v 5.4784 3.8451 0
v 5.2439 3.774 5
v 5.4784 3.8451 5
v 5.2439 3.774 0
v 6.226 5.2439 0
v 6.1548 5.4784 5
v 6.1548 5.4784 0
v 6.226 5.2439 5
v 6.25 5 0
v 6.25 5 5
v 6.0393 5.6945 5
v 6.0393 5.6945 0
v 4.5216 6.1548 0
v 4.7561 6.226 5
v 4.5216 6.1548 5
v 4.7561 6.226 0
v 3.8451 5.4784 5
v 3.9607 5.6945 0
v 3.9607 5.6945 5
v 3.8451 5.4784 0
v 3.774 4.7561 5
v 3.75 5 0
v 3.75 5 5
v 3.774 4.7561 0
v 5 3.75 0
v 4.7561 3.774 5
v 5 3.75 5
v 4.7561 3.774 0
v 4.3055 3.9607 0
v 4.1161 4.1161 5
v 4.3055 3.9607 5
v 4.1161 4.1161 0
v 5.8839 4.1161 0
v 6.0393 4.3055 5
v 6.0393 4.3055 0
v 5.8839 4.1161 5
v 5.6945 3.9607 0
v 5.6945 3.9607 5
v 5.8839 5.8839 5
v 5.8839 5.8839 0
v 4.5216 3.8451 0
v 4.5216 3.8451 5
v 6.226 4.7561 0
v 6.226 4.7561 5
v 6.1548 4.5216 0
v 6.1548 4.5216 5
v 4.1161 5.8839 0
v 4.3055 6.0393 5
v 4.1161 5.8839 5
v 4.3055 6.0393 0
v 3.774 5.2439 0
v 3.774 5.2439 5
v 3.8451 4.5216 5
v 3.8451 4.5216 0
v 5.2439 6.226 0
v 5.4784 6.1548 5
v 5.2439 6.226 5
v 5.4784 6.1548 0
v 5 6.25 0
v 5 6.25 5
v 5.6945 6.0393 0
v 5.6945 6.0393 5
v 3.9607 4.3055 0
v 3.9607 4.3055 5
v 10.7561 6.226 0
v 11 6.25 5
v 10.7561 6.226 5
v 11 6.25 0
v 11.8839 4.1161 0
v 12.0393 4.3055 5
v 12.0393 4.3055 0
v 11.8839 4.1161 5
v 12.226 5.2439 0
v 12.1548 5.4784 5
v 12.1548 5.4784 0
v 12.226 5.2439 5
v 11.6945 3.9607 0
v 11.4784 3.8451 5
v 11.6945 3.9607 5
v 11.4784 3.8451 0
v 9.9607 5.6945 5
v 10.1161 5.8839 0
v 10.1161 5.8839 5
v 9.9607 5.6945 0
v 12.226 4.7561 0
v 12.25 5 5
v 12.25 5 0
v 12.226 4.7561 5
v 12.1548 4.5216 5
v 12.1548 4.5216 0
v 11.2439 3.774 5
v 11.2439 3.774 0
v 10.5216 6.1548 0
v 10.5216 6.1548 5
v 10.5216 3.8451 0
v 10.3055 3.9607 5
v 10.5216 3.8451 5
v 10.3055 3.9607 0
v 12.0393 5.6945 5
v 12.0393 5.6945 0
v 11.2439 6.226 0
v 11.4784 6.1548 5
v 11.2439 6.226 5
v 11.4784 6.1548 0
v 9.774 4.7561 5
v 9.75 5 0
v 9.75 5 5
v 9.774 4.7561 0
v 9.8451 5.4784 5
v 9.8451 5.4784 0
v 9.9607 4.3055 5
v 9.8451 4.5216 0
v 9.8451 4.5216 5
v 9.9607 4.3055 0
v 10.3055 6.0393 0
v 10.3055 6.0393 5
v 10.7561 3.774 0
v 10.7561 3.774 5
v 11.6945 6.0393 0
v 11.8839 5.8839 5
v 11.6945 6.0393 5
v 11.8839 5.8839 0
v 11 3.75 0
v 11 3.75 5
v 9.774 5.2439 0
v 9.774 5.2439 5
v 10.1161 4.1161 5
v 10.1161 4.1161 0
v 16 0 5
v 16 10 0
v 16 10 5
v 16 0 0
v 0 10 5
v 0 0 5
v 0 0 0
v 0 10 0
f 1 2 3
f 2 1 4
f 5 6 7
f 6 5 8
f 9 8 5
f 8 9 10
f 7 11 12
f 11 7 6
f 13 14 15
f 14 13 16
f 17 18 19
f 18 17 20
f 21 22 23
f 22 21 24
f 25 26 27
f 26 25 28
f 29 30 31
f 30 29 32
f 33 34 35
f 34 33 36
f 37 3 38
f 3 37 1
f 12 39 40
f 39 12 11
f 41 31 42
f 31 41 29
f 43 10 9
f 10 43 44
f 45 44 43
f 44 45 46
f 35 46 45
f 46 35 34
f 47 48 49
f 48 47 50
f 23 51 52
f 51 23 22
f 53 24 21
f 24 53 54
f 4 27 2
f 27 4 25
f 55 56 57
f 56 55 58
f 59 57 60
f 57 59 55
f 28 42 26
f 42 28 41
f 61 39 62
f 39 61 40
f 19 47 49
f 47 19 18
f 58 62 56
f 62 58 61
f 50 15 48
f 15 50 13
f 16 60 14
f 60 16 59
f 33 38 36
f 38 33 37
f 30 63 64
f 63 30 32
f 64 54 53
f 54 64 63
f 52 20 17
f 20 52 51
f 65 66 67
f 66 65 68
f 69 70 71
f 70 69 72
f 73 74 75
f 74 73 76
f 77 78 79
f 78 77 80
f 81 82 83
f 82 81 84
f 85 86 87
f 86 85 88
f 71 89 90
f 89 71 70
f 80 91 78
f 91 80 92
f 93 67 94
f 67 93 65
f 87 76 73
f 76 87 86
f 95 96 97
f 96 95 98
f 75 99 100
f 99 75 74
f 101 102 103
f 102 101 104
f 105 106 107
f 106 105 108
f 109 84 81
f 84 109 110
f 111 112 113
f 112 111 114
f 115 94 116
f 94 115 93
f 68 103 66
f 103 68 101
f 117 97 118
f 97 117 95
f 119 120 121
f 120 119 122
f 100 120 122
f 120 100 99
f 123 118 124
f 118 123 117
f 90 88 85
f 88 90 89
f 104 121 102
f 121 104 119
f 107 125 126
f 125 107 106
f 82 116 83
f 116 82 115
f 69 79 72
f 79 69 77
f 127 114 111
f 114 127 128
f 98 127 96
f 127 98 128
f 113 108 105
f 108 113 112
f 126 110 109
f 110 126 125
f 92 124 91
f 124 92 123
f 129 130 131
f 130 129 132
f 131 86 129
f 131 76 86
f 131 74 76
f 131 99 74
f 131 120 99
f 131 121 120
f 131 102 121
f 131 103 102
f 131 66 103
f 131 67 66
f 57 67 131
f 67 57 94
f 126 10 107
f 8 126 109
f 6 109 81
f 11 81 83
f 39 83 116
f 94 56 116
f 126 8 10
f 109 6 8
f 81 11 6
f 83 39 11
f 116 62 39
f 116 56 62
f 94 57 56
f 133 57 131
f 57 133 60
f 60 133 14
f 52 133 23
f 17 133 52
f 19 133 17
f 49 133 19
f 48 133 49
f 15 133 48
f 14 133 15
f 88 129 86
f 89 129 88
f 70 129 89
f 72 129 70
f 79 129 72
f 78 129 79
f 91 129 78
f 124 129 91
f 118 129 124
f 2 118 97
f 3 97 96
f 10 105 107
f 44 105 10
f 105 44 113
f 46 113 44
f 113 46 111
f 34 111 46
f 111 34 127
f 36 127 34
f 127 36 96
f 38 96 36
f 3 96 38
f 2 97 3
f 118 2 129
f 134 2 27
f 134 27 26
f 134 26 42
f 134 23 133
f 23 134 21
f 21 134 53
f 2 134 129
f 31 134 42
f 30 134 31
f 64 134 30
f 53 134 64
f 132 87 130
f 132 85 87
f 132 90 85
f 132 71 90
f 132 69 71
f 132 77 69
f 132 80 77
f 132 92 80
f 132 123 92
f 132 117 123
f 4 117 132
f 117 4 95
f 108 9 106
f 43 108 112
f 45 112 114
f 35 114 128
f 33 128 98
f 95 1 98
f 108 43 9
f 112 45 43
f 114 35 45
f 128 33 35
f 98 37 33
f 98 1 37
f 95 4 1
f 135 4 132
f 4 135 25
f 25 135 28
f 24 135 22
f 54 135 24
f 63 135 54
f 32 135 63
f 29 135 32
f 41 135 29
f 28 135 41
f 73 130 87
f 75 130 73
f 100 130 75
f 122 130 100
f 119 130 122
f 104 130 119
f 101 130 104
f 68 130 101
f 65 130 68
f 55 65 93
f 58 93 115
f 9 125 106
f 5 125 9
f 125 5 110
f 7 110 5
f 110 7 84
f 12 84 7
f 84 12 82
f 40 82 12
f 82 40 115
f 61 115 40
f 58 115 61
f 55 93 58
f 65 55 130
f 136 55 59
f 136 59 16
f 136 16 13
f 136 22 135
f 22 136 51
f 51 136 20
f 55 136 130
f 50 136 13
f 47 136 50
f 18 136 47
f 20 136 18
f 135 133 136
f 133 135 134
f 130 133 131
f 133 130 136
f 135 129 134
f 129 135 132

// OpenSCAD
$fn = 32;

// ----------------------------------------------------------------------
// Micro pad: two-hole pad, 5-20 mm class
// ----------------------------------------------------------------------

// --- parameters (mm) ---
pad_l = 16;               // pad length, X
pad_w = 10;               // pad width, Y
pad_t = 5;                // pad thickness, Z
hole_d = 2.5;             // hole diameter
hole_x = 5;               // X of the first hole centre

difference() {
  cube([pad_l, pad_w, pad_t]);
  for (x = [hole_x, pad_l - hole_x])
    translate([x, pad_w / 2, -1])
      cylinder(h = pad_t + 2, d = hole_d);
}
